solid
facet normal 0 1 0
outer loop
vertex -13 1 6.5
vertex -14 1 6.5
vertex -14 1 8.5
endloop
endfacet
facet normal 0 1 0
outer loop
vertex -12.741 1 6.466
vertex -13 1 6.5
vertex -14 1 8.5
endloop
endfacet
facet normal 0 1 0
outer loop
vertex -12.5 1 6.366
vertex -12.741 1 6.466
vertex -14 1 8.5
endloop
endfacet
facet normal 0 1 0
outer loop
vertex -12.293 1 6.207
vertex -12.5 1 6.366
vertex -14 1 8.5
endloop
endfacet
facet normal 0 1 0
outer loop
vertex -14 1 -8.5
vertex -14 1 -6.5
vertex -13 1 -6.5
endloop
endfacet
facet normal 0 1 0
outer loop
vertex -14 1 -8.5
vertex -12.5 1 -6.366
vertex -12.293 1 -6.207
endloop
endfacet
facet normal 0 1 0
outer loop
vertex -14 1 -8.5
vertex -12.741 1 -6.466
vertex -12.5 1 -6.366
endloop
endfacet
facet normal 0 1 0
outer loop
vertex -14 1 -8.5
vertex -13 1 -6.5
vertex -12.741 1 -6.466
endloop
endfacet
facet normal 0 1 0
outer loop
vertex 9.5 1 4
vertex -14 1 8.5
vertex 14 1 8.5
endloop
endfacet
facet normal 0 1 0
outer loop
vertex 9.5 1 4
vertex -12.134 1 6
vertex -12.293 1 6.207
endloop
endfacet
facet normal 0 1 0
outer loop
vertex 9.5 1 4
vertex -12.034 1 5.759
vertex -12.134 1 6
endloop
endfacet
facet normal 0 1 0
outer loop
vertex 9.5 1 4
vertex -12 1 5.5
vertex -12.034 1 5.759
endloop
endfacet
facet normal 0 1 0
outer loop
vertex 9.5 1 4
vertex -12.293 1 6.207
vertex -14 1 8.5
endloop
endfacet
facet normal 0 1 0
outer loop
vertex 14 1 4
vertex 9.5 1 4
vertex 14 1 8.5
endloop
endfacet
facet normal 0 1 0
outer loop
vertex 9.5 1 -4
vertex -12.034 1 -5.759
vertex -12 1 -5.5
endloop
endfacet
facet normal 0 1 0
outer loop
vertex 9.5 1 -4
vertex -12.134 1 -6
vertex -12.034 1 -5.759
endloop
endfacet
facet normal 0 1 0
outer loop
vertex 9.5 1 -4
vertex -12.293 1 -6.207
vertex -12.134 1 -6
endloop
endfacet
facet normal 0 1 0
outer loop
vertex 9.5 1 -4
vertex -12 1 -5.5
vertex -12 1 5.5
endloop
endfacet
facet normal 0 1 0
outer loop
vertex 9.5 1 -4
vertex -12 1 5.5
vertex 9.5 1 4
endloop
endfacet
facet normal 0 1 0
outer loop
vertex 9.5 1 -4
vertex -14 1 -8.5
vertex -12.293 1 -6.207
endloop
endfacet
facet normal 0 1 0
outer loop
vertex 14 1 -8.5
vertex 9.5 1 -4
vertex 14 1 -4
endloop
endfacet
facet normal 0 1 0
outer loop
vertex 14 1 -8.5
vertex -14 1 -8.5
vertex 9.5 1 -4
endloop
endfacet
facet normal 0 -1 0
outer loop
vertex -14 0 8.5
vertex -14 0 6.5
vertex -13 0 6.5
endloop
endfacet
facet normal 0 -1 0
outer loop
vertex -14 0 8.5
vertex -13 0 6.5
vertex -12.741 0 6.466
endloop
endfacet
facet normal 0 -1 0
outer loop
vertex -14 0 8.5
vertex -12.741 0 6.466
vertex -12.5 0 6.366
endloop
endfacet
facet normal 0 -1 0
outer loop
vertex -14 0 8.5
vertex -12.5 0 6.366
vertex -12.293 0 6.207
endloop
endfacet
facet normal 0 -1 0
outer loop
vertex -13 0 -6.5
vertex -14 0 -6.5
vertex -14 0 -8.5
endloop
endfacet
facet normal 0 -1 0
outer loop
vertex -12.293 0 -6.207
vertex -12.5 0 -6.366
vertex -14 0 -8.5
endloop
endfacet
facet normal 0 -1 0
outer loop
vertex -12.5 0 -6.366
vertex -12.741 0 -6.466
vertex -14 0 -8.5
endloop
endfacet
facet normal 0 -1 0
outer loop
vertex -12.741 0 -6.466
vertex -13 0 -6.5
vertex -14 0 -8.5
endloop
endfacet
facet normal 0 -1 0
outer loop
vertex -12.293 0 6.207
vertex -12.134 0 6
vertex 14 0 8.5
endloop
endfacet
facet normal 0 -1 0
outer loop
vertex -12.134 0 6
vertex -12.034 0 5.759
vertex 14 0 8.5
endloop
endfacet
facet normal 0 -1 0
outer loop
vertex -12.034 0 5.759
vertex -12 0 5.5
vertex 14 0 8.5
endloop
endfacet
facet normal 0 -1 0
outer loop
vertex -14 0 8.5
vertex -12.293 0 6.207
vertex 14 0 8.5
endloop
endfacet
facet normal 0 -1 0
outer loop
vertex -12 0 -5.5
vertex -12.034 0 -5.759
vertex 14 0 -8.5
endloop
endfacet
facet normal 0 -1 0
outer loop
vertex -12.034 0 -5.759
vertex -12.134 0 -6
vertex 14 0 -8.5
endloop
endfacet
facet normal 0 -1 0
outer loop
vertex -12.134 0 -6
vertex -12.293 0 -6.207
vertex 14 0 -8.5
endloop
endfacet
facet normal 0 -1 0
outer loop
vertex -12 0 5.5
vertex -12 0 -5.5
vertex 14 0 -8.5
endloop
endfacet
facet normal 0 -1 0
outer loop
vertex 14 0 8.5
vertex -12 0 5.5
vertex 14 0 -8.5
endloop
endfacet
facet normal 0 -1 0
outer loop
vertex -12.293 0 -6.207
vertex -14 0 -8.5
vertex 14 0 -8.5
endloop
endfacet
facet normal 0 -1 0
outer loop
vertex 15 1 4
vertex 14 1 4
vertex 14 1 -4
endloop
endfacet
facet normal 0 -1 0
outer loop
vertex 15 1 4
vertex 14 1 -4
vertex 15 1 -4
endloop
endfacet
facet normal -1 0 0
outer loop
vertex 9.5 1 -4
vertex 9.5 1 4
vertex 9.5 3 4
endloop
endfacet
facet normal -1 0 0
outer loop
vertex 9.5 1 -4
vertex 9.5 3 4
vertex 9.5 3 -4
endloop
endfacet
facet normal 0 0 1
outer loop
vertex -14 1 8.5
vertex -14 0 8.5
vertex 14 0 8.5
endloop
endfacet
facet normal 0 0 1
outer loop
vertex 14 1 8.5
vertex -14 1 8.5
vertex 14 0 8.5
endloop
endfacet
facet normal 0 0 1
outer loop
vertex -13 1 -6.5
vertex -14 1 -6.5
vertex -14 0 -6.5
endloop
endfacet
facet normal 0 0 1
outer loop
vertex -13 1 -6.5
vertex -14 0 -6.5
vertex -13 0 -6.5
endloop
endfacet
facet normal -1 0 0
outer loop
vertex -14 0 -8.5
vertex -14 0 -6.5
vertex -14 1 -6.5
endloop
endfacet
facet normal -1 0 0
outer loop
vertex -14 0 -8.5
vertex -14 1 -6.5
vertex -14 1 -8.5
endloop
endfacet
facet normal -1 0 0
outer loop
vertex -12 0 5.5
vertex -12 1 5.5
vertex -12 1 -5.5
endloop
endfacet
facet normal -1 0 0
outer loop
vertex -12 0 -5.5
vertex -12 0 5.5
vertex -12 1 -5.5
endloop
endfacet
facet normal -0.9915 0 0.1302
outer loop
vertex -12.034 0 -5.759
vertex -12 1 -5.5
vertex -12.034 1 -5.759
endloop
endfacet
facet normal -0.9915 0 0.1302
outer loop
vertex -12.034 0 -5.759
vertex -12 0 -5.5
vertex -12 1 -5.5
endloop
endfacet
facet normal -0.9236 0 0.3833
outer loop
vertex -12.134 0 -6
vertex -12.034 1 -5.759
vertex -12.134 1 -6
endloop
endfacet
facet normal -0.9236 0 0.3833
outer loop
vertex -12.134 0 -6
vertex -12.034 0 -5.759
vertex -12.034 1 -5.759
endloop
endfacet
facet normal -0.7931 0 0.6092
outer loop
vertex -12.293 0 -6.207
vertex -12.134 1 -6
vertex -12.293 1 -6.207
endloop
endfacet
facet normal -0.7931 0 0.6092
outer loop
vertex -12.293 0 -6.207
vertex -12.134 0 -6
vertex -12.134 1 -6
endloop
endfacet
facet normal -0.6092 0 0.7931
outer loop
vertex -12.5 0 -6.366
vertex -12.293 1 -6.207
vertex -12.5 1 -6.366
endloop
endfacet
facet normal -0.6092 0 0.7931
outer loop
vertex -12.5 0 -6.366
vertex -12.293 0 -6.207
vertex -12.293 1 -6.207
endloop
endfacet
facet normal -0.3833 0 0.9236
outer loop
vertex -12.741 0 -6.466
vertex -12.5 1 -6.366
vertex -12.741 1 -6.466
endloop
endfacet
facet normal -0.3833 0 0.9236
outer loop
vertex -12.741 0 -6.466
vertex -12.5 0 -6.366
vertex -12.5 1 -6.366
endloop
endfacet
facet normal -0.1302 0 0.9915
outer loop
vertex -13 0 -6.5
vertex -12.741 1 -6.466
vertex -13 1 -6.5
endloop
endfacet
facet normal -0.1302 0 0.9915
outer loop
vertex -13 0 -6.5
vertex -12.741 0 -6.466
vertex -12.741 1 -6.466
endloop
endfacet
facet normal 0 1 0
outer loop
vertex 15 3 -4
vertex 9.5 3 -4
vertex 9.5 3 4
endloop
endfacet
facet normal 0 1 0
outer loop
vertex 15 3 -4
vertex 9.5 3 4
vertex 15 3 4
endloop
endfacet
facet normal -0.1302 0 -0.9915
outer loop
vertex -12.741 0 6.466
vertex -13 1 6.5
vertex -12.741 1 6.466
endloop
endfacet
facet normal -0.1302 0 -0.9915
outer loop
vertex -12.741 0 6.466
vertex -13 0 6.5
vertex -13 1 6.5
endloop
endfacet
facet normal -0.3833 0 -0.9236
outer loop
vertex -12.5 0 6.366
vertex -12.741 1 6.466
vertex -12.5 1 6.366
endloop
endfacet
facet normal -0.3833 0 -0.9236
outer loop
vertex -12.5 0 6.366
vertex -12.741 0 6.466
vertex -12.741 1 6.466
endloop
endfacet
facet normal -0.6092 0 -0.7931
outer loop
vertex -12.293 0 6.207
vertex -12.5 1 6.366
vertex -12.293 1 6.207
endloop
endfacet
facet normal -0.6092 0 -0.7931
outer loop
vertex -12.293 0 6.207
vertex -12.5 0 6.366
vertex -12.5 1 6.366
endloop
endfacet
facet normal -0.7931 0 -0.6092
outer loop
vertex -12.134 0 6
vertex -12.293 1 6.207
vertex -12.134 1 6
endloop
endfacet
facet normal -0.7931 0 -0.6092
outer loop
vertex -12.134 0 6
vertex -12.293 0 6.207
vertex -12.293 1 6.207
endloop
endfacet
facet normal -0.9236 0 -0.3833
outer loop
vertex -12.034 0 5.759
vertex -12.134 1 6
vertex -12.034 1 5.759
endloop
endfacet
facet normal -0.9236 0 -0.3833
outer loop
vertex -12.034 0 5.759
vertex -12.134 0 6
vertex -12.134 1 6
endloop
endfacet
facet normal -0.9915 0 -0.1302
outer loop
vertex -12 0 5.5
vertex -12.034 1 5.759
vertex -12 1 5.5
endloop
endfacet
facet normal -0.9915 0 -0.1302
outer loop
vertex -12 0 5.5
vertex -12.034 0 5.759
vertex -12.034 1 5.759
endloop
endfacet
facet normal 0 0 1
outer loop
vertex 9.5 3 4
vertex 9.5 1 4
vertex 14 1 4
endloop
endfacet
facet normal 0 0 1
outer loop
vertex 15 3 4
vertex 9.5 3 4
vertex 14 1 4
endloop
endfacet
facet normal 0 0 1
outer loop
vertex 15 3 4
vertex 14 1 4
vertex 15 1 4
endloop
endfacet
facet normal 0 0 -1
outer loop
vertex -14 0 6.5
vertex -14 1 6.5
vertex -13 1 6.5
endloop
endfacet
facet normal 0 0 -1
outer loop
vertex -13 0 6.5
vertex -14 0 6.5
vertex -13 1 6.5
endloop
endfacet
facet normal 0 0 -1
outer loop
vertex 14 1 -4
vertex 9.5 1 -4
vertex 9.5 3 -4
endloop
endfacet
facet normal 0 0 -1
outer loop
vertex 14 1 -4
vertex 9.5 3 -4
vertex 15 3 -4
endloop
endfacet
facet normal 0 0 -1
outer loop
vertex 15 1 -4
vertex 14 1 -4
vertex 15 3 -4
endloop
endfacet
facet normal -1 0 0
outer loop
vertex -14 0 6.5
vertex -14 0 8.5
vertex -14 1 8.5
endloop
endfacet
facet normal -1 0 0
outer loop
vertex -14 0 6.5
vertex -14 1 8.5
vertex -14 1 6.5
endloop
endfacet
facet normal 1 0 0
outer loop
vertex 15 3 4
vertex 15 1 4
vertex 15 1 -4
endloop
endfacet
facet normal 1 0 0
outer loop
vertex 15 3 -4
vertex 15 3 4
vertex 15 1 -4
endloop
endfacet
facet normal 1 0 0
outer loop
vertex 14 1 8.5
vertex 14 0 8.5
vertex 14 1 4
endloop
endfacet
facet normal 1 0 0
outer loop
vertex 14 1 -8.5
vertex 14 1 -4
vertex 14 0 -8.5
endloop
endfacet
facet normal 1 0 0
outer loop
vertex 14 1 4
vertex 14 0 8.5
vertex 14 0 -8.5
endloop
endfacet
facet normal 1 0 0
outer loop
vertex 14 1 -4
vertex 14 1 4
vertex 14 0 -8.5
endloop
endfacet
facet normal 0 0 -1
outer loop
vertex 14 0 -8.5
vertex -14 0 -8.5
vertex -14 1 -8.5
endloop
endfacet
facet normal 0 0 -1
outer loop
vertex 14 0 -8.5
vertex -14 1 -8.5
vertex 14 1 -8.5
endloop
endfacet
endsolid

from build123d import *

# Parameters (mm, degrees)
SKETCH1_W           = 28
SKETCH1_H           = 17
BOSS_EXTRUDE1_DEPTH = 1
SKETCH2_W           = 5.5
SKETCH2_H           = 8
BOSS_EXTRUDE2_DEPTH = 2
SKETCH3_W           = 2
SKETCH3_H           = 13
CUT_EXTRUDE1_DEPTH  = 18.356554958
FILLET1_R           = 1


with BuildPart() as part:
    # Sketch1 → Boss-Extrude1 (new body)
    with BuildSketch(Plane(origin=(0, 0, 0), x_dir=(1, 0, 0), z_dir=(0, 1, 0))):
        Rectangle(SKETCH1_W, SKETCH1_H)
    extrude(amount=BOSS_EXTRUDE1_DEPTH)

    # Sketch2 → Boss-Extrude2 (add)
    with BuildSketch(Plane(origin=(0, 1, 0), x_dir=(1, 0, 0), z_dir=(0, 1, 0))):
        with Locations((12.25, 0)):
            Rectangle(SKETCH2_W, SKETCH2_H)
    extrude(amount=BOSS_EXTRUDE2_DEPTH)

    # Sketch3 → Cut-Extrude1 (cut, through all)
    with BuildSketch(Plane(origin=(0, 1, 0), x_dir=(1, 0, 0), z_dir=(0, 1, 0))):
        with Locations((-13, 0)):
            Rectangle(SKETCH3_W, SKETCH3_H)
    extrude(amount=-CUT_EXTRUDE1_DEPTH, mode=Mode.SUBTRACT)

    # Fillet1
    fillet1_edges = [part.edges().sort_by_distance(p)[0] for p in [
        (-12, 0.5, -6.5),
        (-12, 0.5, 6.5),
    ]]
    fillet(fillet1_edges, radius=FILLET1_R)


solid = part.part
